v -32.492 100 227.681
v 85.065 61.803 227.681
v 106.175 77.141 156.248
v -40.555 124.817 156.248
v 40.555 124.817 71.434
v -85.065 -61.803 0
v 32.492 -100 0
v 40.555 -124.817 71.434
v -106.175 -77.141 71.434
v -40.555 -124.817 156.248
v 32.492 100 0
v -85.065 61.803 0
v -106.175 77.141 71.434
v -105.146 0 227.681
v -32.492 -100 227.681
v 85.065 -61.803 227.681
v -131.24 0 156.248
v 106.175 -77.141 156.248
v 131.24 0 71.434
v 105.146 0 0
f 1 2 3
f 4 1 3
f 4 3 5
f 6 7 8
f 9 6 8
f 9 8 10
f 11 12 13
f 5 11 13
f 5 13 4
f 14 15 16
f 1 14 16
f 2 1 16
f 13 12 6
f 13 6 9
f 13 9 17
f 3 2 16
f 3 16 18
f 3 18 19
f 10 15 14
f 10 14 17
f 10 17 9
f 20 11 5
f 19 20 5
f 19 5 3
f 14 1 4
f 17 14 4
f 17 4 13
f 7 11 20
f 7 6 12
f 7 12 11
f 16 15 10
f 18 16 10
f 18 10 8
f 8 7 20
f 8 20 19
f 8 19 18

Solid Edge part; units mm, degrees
sketch "Sketch1" plane through (0, 0, 0) normal (0, -1, 0) x (1, 0, 0)
  arc A0 (0, 363.8406) -> (0, -136.1594) centre (0, 113.8406) ccw
  line L0 (0, 363.8406) -> (0, -136.1594)
revolve "RevolvedProtrusion1" add sketch "Sketch1" angle 360 about axis through (0, 0, 363.8406) along (0, 0, -1)
sketch "Sketch2" plane through (0, 0, 0) normal (0, -1, 0) x (1, 0, 0)
  line L0 (-85.0651, 0) -> (-128.677, 147.5749)
  line L1 (-85.0651, 0) -> (68.8191, 0)
extrude "Cutout1" cut sketch "Sketch2" against normal up to next and the other way up to next material side at (-106.919, 0, 73.7733)
sketch "Sketch3" plane through (0, 0, 0) normal (0, -1, 0) x (1, 0, 0)
  line L0 (-68.8191, 227.6813) -> (85.0651, 227.6813)
  line L1 (85.0651, 227.6813) -> (128.677, 80.1064)
extrude "Cutout2" cut sketch "Sketch3" against normal up to next and the other way up to next material side at (8.123, 0, 227.7313)
pattern_circular "Pattern1" count 5 over 360 about axis through (0, 0, 0) along (0, 0, 1) of "Cutout1", "Cutout2"
